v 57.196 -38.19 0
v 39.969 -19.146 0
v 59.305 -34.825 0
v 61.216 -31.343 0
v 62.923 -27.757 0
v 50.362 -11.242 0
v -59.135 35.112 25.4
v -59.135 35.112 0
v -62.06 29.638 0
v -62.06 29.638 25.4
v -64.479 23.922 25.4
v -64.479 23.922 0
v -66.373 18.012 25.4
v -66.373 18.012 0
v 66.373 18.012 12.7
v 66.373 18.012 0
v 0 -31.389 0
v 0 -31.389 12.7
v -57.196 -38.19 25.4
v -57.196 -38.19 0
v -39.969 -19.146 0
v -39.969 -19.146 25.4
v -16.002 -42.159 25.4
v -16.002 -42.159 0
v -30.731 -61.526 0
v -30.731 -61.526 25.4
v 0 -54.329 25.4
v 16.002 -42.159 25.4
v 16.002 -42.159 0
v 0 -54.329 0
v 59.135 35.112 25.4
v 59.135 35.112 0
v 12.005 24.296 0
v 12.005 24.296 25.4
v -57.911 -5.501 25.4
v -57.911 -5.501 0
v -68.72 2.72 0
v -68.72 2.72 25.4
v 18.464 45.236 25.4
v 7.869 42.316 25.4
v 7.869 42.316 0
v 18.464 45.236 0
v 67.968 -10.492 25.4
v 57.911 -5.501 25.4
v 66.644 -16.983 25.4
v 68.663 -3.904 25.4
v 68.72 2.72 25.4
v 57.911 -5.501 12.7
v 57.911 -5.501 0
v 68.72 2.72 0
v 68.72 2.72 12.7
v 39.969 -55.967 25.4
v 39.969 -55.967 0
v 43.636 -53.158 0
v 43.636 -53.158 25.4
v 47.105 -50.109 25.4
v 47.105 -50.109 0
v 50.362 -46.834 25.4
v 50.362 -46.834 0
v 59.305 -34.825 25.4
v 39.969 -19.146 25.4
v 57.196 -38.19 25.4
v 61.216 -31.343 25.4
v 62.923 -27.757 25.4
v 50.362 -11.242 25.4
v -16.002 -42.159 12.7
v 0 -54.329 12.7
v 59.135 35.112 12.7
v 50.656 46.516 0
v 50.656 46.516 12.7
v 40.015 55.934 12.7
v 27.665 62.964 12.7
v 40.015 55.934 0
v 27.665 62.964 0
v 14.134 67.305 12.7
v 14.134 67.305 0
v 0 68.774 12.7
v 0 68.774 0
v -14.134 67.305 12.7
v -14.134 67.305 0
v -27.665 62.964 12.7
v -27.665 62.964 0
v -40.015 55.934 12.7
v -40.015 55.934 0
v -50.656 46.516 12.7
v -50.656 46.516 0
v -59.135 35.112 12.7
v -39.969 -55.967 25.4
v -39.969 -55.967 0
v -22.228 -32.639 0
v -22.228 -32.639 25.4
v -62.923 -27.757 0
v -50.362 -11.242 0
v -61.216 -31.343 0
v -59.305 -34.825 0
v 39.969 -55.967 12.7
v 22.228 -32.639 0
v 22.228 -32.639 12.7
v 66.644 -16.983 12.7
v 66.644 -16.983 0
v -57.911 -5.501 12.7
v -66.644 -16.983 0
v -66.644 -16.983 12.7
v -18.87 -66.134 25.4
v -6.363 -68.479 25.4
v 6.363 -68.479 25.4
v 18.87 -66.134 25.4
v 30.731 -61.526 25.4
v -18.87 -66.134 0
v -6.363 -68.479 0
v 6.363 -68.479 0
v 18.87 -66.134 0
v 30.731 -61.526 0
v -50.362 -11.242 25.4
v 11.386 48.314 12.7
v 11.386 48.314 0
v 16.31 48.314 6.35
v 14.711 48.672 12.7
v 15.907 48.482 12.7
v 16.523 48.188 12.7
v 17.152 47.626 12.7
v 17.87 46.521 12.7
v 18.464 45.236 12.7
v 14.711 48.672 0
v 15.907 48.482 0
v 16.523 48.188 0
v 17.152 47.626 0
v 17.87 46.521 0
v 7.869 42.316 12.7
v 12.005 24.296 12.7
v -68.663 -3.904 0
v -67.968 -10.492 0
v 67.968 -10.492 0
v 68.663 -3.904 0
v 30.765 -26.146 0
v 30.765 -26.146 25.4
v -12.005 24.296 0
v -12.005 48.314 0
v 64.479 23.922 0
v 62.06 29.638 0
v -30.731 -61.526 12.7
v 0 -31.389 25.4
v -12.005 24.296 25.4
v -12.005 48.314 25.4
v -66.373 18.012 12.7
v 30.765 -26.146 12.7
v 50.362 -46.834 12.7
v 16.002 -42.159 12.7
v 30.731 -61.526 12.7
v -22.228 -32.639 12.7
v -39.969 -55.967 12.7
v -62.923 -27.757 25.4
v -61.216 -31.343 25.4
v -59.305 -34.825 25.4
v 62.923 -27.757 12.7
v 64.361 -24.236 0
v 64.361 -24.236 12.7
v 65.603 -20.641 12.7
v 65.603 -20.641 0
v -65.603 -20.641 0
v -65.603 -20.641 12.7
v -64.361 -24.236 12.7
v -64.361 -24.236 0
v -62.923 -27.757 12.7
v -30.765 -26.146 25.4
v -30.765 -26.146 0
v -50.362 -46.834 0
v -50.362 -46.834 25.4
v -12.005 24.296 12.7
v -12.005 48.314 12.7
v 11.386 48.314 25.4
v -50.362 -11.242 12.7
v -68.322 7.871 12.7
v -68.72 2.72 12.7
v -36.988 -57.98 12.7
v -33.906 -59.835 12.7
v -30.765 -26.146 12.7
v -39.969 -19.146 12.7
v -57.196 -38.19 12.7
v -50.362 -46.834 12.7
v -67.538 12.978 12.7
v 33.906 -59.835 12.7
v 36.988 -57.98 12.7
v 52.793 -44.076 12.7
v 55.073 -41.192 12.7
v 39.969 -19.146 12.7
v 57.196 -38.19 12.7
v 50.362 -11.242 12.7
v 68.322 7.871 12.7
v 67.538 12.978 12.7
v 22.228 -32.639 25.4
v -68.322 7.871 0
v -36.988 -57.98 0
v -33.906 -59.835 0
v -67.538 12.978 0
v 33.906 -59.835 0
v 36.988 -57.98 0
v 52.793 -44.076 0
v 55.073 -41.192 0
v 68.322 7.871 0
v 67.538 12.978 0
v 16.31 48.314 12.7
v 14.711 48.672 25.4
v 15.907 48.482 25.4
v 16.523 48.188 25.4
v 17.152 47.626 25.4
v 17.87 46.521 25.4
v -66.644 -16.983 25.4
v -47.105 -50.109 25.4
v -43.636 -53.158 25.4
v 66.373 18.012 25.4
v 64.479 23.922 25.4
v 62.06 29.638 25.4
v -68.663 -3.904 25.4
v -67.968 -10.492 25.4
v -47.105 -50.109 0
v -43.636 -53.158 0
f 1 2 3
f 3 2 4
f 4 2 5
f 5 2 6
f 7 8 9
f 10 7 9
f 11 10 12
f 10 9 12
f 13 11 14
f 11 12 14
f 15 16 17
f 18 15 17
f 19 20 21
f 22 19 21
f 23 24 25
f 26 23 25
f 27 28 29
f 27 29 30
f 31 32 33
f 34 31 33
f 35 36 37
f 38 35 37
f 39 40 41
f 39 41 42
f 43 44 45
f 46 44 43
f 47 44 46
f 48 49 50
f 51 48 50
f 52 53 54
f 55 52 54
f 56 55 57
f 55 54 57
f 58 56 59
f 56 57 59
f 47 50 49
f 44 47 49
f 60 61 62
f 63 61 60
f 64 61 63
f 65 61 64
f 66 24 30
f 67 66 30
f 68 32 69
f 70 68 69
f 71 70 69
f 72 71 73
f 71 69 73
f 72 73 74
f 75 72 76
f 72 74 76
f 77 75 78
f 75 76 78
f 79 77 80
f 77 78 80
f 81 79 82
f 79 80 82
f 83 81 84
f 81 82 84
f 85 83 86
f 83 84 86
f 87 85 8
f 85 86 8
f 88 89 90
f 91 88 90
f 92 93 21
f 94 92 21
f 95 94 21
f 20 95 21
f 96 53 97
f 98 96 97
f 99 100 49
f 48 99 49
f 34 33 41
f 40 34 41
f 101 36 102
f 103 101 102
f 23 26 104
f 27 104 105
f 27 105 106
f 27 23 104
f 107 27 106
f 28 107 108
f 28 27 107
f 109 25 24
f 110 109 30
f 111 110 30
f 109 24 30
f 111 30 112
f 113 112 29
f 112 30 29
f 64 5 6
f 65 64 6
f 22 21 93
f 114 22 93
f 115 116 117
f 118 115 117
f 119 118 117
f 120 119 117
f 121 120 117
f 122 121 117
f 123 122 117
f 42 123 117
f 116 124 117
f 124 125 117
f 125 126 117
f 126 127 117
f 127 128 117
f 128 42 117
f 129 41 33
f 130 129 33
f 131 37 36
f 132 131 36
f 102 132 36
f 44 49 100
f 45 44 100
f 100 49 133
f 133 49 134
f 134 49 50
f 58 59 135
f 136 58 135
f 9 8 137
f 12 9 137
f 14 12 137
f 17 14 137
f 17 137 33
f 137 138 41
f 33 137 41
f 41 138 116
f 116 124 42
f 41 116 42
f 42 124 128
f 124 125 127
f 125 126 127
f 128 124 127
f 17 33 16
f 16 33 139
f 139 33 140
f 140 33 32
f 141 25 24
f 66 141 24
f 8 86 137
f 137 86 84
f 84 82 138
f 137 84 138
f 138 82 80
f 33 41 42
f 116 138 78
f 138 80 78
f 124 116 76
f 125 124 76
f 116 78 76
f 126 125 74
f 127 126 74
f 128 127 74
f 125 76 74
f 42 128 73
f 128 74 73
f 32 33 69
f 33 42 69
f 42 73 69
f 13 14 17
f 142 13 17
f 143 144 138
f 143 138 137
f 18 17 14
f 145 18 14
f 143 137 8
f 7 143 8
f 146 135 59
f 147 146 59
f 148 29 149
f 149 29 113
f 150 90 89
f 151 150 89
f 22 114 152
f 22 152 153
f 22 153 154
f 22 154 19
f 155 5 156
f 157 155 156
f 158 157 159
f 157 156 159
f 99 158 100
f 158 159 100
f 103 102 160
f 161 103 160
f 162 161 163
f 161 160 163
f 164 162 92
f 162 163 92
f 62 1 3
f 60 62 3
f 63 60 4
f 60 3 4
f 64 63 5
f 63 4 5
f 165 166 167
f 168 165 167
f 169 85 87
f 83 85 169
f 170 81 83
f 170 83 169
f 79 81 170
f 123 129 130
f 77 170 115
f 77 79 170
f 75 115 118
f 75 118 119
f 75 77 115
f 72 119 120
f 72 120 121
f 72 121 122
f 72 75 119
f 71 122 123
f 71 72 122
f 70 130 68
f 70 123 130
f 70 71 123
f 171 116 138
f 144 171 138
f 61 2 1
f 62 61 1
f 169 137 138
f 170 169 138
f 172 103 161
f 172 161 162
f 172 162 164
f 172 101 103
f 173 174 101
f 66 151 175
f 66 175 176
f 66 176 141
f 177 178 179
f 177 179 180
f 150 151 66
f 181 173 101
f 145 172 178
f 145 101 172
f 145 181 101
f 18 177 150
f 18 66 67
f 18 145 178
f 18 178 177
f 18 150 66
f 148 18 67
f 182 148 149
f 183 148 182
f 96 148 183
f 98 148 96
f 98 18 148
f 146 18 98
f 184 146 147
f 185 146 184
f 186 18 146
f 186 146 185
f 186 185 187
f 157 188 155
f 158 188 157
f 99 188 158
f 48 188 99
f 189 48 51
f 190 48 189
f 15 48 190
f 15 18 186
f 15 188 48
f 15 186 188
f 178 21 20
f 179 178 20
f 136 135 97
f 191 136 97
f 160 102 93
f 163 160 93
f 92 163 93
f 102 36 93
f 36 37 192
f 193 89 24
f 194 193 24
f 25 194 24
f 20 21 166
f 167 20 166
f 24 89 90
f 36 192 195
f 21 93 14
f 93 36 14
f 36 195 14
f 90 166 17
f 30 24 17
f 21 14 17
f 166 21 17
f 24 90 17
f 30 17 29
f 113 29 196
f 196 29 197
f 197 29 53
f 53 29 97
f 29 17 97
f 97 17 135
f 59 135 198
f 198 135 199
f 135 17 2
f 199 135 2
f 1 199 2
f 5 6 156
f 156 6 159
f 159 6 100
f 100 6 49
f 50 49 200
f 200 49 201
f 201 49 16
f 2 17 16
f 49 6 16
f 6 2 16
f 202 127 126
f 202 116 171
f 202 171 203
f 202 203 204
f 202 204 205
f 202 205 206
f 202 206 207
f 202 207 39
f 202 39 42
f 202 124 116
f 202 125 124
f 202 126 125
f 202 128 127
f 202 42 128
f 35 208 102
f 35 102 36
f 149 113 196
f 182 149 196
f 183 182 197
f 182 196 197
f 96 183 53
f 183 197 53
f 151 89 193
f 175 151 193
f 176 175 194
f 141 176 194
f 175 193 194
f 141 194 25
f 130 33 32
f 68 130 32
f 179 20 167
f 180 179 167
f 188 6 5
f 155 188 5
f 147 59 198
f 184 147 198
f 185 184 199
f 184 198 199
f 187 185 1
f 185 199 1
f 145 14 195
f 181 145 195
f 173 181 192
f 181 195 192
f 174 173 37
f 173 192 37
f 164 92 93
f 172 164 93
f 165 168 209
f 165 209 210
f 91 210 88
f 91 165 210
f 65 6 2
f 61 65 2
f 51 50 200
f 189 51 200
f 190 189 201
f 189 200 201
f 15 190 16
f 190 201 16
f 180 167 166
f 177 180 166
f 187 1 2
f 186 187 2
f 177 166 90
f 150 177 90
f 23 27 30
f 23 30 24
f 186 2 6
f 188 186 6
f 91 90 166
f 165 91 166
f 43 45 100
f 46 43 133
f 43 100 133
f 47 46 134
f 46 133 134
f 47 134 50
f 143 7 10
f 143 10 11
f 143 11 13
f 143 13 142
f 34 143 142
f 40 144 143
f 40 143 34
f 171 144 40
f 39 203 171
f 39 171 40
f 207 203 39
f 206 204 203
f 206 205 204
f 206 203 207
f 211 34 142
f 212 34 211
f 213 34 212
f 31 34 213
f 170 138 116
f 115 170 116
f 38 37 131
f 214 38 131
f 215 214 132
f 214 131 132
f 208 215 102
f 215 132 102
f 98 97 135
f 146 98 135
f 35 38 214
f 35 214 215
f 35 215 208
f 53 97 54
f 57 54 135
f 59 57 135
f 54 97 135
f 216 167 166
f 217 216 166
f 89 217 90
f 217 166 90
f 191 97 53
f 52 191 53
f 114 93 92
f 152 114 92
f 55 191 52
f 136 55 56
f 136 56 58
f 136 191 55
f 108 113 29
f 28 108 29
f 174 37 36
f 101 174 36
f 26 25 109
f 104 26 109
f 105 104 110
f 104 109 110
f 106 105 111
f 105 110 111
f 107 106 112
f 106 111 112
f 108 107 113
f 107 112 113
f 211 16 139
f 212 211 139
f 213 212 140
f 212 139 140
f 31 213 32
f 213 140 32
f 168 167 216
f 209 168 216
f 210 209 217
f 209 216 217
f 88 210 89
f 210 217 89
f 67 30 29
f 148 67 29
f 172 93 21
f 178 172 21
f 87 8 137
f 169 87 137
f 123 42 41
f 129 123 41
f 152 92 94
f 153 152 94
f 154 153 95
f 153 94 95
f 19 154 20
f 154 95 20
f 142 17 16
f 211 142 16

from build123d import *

# Parameters (mm, degrees)
F1_DEPTH = 25.4
F2_DEPTH = 12.7


with BuildPart() as f1:
    # F0 (on Top) → F1 (new body)
    with BuildSketch(Plane.XY):
        with BuildLine():
            ThreePointArc((-59.1347993745, 35.1122985584), (-63.3337577346, 26.8073336669), (-66.3730603731, 18.0115203087))
            Line((-66.3730603731, 18.0115203087), (0, -31.3885398209))
            Line((0, -31.3885398209), (66.3730603731, 18.0115203087))
            ThreePointArc((66.3730603731, 18.0115203087), (63.3337577346, 26.8073336669), (59.1347993745, 35.1122985584))
            Line((59.1347993745, 35.1122985584), (12.0048329489, 24.2962053983))
            Line((12.0048329489, 24.2962053983), (7.8694800897, 42.3155621592))
            Line((7.8694800897, 42.3155621592), (18.4638444334, 45.2364236116))
            add(Edge.make_bspline(
                [(11.3860378042, 48.313729465), (13.2458917171, 48.6271602597), (16.730228889, 49.2143561471), (17.9125959667, 46.5013114457), (18.4638444334, 45.2364236116)],
                knots=[0, 0, 0, 0, 0.5337755278, 1, 1, 1, 1], degree=3))
            Line((11.3860378042, 48.313729465), (-12.0048329489, 48.313729465))
            Line((-12.0048329489, 48.313729465), (-12.0048329489, 24.2962053983))
            Line((-12.0048329489, 24.2962053983), (-59.1347993745, 35.1122985584))
        make_face()
    extrude(amount=F1_DEPTH)


with BuildPart() as f1b:
    # F0 (on Top) → F1, piece 2 (new body)
    with BuildSketch(Plane.XY):
        with BuildLine():
            Line((-50.3623053931, -11.241866409), (-62.9231440041, -27.7574486535))
            ThreePointArc((-62.9231440041, -27.7574486535), (-60.2854203646, -33.0978261913), (-57.1955084894, -38.1899439087))
            Line((-57.1955084894, -38.1899439087), (-39.9692459516, -19.1462527265))
            Line((-39.9692459516, -19.1462527265), (-50.3623053931, -11.241866409))
        make_face()
    extrude(amount=F1_DEPTH)


with BuildPart() as f1c:
    # F0 (on Top) → F1, piece 3 (new body)
    with BuildSketch(Plane.XY):
        with BuildLine():
            ThreePointArc((-68.7197267242, 2.7197731651), (-68.3948849703, -7.2067827093), (-66.6436375776, -16.9830379362))
            Line((-66.6436375776, -16.9830379362), (-57.910899767, -5.5008229346))
            Line((-57.910899767, -5.5008229346), (-68.7197267242, 2.7197731651))
        make_face()
    extrude(amount=F1_DEPTH)


with BuildPart() as f1d:
    # F0 (on Top) → F1, piece 4 (new body)
    with BuildSketch(Plane.XY):
        with BuildLine():
            Line((-30.7649994294, -26.146493674), (-50.3623053931, -46.834135015))
            ThreePointArc((-50.3623053931, -46.834135015), (-45.3960092047, -51.662368852), (-39.9692459516, -55.9665738203))
            Line((-39.9692459516, -55.9665738203), (-22.2278628602, -32.6393676798))
            Line((-22.2278628602, -32.6393676798), (-30.7649994294, -26.146493674))
        make_face()
    extrude(amount=F1_DEPTH)


with BuildPart() as f1e:
    # F0 (on Top) → F1, piece 5 (new body)
    with BuildSketch(Plane.XY):
        with BuildLine():
            Line((-16.0019993782, -42.159114033), (-30.7310750928, -61.5255965494))
            ThreePointArc((-30.7310750928, -61.5255965494), (0, -68.7735269353), (30.7310750928, -61.5255965494))
            Line((30.7310750928, -61.5255965494), (16.0019993782, -42.159114033))
            Line((16.0019993782, -42.159114033), (0, -54.3293499149))
            Line((0, -54.3293499149), (-16.0019993782, -42.159114033))
        make_face()
    extrude(amount=F1_DEPTH)


with BuildPart() as f1f:
    # F0 (on Top) → F1, piece 6 (new body)
    with BuildSketch(Plane.XY):
        with BuildLine():
            Line((22.2278628602, -32.6393676798), (39.9692459516, -55.9665738203))
            ThreePointArc((39.9692459516, -55.9665738203), (45.3960092047, -51.662368852), (50.3623053931, -46.834135015))
            Line((50.3623053931, -46.834135015), (30.7649994294, -26.146493674))
            Line((30.7649994294, -26.146493674), (22.2278628602, -32.6393676798))
        make_face()
    extrude(amount=F1_DEPTH)


with BuildPart() as f1g:
    # F0 (on Top) → F1, piece 7 (new body)
    with BuildSketch(Plane.XY):
        with BuildLine():
            Line((39.9692459516, -19.1462527265), (57.1955084894, -38.1899439087))
            ThreePointArc((57.1955084894, -38.1899439087), (60.2854203646, -33.0978261913), (62.9231440041, -27.7574486535))
            Line((62.9231440041, -27.7574486535), (50.3623053931, -11.241866409))
            Line((50.3623053931, -11.241866409), (39.9692459516, -19.1462527265))
        make_face()
    extrude(amount=F1_DEPTH)


with BuildPart() as f1h:
    # F0 (on Top) → F1, piece 8 (new body)
    with BuildSketch(Plane.XY):
        with BuildLine():
            ThreePointArc((66.6436375776, -16.9830379362), (68.3948849703, -7.2067827093), (68.7197267242, 2.7197731651))
            Line((68.7197267242, 2.7197731651), (57.910899767, -5.5008229346))
            Line((57.910899767, -5.5008229346), (66.6436375776, -16.9830379362))
        make_face()
    extrude(amount=F1_DEPTH)


with BuildPart() as f2:
    # F0 (on Top) → F2 (new body)
    with BuildSketch(Plane.XY):
        with BuildLine():
            ThreePointArc((59.1347993745, 35.1122985584), (0, 68.7735269353), (-59.1347993745, 35.1122985584))
            Line((-59.1347993745, 35.1122985584), (-12.0048329489, 24.2962053983))
            Line((-12.0048329489, 24.2962053983), (-12.0048329489, 48.313729465))
            Line((-12.0048329489, 48.313729465), (11.3860378042, 48.313729465))
            add(Edge.make_bspline(
                [(11.3860378042, 48.313729465), (13.2458917171, 48.6271602597), (16.730228889, 49.2143561471), (17.9125959667, 46.5013114457), (18.4638444334, 45.2364236116)],
                knots=[0, 0, 0, 0, 0.5337755278, 1, 1, 1, 1], degree=3))
            Line((18.4638444334, 45.2364236116), (7.8694800897, 42.3155621592))
            Line((7.8694800897, 42.3155621592), (12.0048329489, 24.2962053983))
            Line((12.0048329489, 24.2962053983), (59.1347993745, 35.1122985584))
        make_face()
    extrude(amount=F2_DEPTH)


with BuildPart() as f2b:
    # F0 (on Top) → F2, piece 2 (new body)
    with BuildSketch(Plane.XY):
        with BuildLine():
            ThreePointArc((-66.6436375776, -16.9830379362), (-65.006997346, -22.4474564969), (-62.9231440041, -27.7574486535))
            Line((-62.9231440041, -27.7574486535), (-50.3623053931, -11.241866409))
            Line((-50.3623053931, -11.241866409), (-39.9692459516, -19.1462527265))
            Line((-39.9692459516, -19.1462527265), (-57.1955084894, -38.1899439087))
            Line((-57.1955084894, -38.1899439087), (-50.3623053931, -46.834135015))
            Line((-50.3623053931, -46.834135015), (-30.7649994294, -26.146493674))
            Line((-30.7649994294, -26.146493674), (-22.2278628602, -32.6393676798))
            Line((-22.2278628602, -32.6393676798), (-39.9692459516, -55.9665738203))
            ThreePointArc((-39.9692459516, -55.9665738203), (-35.4592658183, -58.9274000338), (-30.7310750928, -61.5255965494))
            Line((-30.7310750928, -61.5255965494), (-16.0019993782, -42.159114033))
            Line((-16.0019993782, -42.159114033), (0, -54.3293499149))
            Line((0, -54.3293499149), (16.0019993782, -42.159114033))
            Line((16.0019993782, -42.159114033), (30.7310750928, -61.5255965494))
            ThreePointArc((30.7310750928, -61.5255965494), (35.4592658183, -58.9274000338), (39.9692459516, -55.9665738203))
            Line((39.9692459516, -55.9665738203), (22.2278628602, -32.6393676798))
            Line((22.2278628602, -32.6393676798), (30.7649994294, -26.146493674))
            Line((30.7649994294, -26.146493674), (50.3623053931, -46.834135015))
            ThreePointArc((50.3623053931, -46.834135015), (53.9523061766, -42.6491109561), (57.1955084894, -38.1899439087))
            Line((57.1955084894, -38.1899439087), (39.9692459516, -19.1462527265))
            Line((39.9692459516, -19.1462527265), (50.3623053931, -11.241866409))
            Line((50.3623053931, -11.241866409), (62.9231440041, -27.7574486535))
            ThreePointArc((62.9231440041, -27.7574486535), (65.006997346, -22.4474564969), (66.6436375776, -16.9830379362))
            Line((66.6436375776, -16.9830379362), (57.910899767, -5.5008229346))
            Line((57.910899767, -5.5008229346), (68.7197267242, 2.7197731651))
            ThreePointArc((68.7197267242, 2.7197731651), (67.9777512434, 10.431842743), (66.3730603731, 18.0115203087))
            Line((66.3730603731, 18.0115203087), (0, -31.3885398209))
            Line((0, -31.3885398209), (-66.3730603731, 18.0115203087))
            ThreePointArc((-66.3730603731, 18.0115203087), (-67.9777512434, 10.431842743), (-68.7197267242, 2.7197731651))
            Line((-68.7197267242, 2.7197731651), (-57.910899767, -5.5008229346))
            Line((-57.910899767, -5.5008229346), (-66.6436375776, -16.9830379362))
        make_face()
    extrude(amount=F2_DEPTH)


solid = Compound([f1.part, f1b.part, f1c.part, f1d.part, f1e.part, f1f.part, f1g.part, f1h.part, f2.part, f2b.part])
